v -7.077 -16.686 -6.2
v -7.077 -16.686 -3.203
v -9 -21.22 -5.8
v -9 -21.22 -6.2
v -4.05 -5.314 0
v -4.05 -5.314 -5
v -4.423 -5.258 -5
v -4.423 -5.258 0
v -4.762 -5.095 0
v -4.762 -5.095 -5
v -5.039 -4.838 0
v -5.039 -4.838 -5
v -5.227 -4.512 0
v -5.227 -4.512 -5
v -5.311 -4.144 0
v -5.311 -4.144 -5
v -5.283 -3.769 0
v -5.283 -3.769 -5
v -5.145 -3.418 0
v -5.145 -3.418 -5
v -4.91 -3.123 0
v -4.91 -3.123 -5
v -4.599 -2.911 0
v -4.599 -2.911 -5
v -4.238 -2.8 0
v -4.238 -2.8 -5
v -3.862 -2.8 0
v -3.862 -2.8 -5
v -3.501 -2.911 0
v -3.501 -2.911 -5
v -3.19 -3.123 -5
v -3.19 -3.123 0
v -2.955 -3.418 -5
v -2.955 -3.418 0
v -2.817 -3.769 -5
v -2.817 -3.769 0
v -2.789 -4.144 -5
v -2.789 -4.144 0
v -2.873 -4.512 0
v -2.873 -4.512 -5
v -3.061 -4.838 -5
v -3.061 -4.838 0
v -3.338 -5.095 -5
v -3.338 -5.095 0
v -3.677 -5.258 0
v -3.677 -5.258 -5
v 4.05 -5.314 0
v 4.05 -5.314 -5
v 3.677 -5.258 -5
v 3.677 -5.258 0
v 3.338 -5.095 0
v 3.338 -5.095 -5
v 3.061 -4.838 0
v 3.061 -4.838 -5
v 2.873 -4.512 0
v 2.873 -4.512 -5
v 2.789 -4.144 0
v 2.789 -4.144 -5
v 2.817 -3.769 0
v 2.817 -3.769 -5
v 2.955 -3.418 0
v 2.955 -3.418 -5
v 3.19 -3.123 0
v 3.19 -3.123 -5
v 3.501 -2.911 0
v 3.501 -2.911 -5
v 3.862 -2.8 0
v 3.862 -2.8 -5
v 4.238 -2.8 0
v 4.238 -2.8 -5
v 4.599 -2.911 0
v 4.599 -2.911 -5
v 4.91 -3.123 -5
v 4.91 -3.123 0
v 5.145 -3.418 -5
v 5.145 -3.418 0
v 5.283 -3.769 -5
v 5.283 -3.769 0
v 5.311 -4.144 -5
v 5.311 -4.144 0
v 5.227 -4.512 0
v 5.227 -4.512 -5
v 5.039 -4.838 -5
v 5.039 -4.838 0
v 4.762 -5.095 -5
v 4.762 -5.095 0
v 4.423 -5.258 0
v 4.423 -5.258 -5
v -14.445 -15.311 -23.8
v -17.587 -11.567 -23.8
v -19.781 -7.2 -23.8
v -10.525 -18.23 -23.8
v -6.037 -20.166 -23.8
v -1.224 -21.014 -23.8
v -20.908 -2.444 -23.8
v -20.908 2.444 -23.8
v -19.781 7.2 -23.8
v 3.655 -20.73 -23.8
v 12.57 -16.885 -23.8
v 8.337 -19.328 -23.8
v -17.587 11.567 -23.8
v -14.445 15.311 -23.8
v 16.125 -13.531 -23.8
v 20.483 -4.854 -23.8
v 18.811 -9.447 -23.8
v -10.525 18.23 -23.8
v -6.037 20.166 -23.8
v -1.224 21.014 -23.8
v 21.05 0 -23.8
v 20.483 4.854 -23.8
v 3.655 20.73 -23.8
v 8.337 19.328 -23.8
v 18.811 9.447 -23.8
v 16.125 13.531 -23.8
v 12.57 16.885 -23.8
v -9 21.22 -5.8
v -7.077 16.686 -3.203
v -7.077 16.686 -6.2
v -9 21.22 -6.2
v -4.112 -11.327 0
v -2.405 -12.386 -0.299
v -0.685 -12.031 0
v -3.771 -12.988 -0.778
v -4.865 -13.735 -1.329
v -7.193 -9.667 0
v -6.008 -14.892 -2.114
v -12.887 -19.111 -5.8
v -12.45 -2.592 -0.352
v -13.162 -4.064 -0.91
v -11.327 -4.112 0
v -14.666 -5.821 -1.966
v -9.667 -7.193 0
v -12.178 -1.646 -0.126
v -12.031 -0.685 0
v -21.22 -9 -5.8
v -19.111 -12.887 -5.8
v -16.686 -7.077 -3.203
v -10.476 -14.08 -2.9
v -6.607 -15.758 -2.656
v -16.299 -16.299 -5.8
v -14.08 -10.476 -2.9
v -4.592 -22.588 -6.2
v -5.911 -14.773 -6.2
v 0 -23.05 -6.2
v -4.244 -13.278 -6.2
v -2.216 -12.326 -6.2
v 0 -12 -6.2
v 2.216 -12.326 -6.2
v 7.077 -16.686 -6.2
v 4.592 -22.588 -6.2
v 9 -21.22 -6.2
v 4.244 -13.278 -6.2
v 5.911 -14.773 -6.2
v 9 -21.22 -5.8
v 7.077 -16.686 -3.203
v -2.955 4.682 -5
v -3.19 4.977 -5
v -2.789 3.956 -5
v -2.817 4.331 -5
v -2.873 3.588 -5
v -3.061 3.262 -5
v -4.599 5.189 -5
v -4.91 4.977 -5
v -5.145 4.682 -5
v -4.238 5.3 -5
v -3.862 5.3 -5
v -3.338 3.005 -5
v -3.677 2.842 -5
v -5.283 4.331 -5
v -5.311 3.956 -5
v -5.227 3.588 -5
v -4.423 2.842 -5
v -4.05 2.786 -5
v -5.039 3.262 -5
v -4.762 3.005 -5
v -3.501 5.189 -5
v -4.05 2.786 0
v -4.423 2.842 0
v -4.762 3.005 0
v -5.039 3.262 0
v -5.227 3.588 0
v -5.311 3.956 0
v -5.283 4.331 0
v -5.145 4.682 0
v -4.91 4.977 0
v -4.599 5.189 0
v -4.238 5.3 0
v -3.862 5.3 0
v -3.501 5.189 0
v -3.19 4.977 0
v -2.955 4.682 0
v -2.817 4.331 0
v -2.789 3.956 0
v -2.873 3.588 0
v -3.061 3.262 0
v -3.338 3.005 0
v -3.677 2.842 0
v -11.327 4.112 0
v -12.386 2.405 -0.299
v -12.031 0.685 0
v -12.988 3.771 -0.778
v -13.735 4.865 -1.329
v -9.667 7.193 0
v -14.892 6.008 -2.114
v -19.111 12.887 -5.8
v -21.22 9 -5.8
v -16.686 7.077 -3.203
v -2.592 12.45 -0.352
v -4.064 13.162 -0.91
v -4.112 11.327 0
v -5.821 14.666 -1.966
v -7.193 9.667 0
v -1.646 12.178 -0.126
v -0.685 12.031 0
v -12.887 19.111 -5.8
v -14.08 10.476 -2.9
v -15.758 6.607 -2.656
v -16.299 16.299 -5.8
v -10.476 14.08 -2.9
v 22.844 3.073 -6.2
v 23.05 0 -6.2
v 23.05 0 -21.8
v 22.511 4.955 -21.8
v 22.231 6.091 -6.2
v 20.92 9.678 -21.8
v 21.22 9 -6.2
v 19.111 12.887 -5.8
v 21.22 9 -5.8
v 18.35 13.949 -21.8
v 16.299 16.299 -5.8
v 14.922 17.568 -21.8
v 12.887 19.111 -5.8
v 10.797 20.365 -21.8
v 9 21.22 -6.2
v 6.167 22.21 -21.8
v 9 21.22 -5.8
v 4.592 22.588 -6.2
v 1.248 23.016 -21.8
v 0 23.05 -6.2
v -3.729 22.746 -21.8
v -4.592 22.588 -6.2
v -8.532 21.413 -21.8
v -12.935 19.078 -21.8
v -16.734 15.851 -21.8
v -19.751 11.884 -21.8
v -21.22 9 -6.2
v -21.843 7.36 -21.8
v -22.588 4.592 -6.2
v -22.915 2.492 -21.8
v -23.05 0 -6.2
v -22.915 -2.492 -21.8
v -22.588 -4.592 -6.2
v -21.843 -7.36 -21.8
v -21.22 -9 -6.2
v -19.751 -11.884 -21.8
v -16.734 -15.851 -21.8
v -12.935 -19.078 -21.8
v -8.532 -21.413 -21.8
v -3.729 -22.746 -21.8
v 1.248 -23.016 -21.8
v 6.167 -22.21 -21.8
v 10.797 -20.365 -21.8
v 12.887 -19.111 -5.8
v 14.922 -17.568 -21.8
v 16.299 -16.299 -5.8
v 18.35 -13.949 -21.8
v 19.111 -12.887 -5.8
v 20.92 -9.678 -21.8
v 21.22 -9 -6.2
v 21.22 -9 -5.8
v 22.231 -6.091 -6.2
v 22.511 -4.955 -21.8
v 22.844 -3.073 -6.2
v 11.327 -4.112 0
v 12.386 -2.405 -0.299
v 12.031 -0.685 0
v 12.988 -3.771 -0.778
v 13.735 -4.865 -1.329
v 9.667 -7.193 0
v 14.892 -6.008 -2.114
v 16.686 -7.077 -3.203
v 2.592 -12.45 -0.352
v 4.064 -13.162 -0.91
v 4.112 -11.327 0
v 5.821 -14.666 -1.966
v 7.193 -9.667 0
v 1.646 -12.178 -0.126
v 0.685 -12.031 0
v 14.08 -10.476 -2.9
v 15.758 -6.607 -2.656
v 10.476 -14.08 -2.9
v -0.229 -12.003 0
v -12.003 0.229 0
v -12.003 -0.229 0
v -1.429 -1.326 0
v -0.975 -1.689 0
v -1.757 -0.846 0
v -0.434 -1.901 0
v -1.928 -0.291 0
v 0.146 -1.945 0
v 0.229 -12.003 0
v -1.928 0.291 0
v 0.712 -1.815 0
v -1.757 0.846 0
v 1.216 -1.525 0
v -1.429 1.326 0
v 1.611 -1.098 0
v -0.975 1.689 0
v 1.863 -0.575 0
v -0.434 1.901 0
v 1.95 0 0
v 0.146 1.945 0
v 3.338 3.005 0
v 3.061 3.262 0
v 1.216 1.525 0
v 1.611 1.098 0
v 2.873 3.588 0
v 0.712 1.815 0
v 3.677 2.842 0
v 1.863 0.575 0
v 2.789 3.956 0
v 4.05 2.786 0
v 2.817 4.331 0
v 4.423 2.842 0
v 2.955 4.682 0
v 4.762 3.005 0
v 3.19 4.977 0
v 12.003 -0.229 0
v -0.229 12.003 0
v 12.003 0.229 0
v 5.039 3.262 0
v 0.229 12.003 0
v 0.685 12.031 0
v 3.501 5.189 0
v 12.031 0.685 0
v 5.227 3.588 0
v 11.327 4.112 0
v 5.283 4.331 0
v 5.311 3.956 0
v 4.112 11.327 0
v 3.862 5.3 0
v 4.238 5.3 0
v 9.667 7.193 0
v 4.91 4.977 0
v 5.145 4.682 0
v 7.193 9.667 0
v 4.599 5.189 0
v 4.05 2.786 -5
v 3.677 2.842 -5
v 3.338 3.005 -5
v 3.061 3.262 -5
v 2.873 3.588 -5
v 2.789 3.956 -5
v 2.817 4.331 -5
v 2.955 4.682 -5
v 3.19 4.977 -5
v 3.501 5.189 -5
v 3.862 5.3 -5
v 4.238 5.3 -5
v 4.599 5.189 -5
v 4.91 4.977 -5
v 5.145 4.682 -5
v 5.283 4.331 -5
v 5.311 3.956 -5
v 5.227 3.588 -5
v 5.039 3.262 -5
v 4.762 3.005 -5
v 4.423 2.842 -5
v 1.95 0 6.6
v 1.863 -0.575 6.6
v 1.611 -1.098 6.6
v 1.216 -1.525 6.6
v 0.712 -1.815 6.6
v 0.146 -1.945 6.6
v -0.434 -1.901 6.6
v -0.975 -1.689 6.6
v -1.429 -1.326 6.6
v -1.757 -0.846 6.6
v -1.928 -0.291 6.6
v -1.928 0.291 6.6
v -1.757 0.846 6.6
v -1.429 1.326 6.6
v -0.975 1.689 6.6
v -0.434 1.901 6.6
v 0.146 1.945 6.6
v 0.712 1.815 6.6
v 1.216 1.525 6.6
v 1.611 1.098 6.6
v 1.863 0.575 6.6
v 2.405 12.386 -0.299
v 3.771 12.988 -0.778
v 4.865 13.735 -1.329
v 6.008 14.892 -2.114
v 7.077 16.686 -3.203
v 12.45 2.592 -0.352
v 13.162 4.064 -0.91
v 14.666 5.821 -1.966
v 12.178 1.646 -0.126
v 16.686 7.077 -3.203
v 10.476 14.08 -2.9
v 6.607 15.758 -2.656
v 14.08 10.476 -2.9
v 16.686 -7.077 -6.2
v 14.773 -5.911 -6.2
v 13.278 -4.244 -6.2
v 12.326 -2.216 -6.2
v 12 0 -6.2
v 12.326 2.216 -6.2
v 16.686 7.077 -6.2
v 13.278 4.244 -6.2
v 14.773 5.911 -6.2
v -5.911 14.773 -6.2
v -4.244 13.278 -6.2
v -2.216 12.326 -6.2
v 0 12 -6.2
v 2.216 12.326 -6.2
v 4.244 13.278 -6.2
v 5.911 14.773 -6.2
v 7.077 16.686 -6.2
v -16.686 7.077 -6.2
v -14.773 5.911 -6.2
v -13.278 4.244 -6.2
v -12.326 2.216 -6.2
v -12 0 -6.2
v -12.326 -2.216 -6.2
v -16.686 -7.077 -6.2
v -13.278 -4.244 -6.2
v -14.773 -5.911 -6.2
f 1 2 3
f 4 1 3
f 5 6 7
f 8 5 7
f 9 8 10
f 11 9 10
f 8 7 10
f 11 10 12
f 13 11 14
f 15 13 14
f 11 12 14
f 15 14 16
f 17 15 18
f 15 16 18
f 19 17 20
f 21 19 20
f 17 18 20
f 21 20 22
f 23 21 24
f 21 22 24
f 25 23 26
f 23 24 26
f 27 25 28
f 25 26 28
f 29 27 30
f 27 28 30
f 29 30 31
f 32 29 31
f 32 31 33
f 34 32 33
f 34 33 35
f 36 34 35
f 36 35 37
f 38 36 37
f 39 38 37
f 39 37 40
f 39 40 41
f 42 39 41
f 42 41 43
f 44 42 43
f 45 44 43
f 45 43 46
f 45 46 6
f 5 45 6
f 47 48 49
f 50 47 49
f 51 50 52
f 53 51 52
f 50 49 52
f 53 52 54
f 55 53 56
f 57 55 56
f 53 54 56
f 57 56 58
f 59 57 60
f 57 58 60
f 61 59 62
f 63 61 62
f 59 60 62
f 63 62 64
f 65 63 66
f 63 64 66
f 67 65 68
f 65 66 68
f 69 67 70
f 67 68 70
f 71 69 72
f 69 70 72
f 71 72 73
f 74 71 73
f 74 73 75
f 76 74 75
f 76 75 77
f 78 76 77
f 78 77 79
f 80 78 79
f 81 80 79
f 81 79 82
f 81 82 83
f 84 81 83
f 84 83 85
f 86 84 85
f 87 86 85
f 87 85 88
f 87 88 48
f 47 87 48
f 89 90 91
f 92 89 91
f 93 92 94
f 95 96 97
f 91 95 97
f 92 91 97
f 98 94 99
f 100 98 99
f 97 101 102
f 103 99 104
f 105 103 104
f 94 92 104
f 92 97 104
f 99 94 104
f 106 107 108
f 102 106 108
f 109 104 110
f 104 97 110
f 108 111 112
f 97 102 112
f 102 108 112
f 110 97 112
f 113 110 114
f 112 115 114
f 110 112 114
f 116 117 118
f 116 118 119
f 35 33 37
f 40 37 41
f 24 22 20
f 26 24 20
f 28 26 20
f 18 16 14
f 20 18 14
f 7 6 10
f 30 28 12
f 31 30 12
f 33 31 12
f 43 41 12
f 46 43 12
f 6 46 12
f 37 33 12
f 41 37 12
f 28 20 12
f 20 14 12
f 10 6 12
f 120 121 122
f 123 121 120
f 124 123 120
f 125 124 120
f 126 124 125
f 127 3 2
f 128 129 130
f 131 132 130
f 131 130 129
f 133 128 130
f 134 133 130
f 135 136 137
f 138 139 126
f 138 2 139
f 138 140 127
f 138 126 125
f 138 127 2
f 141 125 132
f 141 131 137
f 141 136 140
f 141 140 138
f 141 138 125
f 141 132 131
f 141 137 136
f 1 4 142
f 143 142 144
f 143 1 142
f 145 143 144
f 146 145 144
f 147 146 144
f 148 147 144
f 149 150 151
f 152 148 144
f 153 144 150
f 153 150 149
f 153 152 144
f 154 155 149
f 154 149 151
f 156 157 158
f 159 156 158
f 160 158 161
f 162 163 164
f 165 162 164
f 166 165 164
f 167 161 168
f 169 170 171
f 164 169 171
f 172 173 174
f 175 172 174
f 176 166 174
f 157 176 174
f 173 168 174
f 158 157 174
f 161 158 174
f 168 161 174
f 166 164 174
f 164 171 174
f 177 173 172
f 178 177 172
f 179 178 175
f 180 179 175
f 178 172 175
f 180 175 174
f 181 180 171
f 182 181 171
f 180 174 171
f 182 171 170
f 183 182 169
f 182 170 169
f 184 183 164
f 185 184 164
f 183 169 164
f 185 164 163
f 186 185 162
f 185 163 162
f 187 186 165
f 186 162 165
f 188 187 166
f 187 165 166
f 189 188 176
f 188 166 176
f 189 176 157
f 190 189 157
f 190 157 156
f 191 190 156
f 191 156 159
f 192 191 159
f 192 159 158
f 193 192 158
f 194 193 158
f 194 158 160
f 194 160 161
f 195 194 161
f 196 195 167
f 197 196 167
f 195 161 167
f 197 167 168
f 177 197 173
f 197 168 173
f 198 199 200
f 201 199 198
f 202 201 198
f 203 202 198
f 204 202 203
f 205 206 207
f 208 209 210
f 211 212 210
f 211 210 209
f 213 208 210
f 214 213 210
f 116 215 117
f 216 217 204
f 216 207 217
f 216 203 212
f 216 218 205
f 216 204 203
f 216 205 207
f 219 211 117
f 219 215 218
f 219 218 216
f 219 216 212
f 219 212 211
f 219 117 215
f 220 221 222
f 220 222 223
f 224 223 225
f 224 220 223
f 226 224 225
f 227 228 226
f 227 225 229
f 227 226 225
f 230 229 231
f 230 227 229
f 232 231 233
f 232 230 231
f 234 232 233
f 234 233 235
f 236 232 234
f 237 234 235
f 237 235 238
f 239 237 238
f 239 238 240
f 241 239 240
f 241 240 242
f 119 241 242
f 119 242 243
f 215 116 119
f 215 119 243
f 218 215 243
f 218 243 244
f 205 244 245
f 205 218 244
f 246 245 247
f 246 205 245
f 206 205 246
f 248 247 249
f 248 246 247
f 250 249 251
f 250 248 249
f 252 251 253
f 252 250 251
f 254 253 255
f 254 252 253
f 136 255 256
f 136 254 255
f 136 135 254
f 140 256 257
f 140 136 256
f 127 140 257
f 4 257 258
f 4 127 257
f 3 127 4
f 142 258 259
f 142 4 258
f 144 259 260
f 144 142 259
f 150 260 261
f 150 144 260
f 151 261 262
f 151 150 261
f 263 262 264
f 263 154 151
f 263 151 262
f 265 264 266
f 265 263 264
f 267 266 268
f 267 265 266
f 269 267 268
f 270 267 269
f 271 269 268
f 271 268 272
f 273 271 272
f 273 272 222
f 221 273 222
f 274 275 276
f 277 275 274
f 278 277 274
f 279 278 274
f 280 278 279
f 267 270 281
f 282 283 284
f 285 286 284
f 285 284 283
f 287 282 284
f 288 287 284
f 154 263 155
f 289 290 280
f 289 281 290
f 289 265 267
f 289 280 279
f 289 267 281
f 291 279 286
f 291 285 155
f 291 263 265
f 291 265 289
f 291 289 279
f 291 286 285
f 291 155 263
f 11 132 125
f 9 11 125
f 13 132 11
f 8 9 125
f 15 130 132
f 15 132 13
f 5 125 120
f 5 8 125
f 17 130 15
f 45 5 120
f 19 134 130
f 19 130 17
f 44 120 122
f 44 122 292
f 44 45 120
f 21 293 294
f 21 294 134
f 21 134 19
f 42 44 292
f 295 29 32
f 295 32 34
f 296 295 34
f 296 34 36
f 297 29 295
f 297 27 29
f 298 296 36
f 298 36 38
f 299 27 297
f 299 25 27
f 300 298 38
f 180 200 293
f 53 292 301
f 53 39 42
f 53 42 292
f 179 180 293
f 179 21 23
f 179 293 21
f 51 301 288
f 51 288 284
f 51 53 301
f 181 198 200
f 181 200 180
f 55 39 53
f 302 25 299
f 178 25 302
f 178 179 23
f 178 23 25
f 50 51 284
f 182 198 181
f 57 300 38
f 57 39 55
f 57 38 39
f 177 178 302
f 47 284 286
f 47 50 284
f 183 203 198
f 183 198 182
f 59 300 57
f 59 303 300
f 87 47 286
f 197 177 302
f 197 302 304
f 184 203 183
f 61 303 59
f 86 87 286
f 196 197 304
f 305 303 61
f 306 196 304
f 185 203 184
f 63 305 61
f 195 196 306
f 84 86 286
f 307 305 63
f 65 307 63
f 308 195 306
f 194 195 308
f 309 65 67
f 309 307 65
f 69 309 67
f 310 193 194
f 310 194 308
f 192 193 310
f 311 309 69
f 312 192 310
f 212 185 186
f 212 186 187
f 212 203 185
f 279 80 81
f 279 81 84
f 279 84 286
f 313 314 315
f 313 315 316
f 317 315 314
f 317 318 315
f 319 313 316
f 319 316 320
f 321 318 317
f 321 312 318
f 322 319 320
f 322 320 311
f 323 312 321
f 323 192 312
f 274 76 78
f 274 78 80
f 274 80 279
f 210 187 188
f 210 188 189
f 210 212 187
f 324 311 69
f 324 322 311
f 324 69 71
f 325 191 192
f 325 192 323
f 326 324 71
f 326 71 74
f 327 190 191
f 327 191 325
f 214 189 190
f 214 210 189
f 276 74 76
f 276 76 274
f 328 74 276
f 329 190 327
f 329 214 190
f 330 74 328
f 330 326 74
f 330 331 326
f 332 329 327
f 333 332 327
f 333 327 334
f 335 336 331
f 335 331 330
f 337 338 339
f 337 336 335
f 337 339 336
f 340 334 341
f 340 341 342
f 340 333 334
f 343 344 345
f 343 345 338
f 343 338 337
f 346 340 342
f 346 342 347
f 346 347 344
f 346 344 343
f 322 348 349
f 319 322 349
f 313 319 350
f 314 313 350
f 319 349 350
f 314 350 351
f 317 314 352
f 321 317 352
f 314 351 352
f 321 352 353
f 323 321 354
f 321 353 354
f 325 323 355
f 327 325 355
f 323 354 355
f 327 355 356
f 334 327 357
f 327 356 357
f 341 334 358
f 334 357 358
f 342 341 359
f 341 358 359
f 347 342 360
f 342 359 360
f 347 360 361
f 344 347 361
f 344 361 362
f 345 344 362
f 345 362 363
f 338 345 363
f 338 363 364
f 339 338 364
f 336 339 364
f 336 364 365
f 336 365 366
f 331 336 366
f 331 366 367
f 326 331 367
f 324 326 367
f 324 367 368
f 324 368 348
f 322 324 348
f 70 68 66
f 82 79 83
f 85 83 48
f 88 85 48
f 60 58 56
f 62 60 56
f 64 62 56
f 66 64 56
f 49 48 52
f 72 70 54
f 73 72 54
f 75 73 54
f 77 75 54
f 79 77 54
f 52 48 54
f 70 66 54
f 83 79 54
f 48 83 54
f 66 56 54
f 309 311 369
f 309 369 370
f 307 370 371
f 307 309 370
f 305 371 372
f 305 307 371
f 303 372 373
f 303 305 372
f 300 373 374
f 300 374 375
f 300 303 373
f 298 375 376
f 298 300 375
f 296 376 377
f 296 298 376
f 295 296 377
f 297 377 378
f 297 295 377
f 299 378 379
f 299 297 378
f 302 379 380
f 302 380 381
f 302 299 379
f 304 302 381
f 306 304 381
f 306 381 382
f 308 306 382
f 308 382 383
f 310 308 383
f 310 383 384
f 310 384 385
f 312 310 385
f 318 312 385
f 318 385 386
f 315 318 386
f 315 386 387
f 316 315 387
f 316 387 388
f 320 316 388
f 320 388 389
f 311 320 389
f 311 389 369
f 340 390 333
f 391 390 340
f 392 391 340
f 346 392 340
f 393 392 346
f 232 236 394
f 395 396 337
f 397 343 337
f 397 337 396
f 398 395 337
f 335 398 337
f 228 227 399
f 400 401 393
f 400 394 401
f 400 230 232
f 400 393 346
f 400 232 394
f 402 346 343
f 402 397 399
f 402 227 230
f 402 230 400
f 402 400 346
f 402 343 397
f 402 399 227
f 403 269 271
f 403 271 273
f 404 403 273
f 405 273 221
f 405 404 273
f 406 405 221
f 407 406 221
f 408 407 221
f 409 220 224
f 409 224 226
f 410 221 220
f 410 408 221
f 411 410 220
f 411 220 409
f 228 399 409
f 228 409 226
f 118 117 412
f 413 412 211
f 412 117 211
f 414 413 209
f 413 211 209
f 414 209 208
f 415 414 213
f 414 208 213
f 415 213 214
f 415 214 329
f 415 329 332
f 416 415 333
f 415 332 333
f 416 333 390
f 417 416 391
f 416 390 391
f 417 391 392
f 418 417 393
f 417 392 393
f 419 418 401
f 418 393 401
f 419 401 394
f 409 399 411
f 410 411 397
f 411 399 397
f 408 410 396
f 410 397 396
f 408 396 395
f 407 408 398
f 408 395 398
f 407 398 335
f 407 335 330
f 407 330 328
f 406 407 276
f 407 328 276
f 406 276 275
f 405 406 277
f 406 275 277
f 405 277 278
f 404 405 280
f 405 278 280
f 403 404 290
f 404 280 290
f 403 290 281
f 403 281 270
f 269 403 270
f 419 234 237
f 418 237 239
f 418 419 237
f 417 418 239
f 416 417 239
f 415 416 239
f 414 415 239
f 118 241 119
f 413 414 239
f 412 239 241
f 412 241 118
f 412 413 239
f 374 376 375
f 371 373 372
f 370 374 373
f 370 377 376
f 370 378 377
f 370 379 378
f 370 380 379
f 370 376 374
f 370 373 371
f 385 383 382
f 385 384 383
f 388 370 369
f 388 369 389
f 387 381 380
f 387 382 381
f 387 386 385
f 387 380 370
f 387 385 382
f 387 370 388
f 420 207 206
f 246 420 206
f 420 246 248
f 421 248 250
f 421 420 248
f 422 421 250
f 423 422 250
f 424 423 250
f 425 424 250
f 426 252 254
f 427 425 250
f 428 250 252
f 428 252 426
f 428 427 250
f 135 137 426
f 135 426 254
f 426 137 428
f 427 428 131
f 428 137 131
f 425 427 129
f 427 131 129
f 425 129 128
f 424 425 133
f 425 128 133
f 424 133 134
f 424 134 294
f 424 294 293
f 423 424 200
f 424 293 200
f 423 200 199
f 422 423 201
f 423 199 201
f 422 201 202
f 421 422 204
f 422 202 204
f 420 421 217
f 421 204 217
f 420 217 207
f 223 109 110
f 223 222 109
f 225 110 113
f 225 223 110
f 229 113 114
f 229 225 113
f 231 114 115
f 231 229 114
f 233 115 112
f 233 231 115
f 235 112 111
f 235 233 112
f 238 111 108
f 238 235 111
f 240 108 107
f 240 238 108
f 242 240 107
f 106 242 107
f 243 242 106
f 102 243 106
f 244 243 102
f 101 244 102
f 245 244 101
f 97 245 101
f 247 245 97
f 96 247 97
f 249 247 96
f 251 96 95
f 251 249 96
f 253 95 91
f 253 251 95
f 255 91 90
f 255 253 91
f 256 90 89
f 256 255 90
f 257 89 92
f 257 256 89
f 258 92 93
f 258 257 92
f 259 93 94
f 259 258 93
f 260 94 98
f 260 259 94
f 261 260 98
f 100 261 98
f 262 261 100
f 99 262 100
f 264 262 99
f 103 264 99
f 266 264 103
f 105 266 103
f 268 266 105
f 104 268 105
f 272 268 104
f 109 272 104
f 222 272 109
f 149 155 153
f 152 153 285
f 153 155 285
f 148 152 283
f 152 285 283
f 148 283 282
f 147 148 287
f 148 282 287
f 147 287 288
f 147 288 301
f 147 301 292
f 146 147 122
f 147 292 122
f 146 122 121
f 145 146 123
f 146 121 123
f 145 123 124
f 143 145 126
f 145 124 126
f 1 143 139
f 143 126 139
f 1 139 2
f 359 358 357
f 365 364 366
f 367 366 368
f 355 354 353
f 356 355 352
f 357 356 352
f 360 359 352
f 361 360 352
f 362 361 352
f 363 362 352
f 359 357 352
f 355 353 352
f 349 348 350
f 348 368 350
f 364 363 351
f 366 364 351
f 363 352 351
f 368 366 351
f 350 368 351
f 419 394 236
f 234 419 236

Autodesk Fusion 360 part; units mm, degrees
sketch "Sketch1" plane through (0, 0, 0) normal (0, 0, 1) x (1, 0, 0)
  circle A0 centre (0, 0) radius 23.05
  line L0 (4.05, 4.05) -> (-4.05, 4.05) construction
  line L1 (-4.05, 4.05) -> (-4.05, -4.05) construction
  line L2 (-4.05, -4.05) -> (4.05, -4.05) construction
  line L3 (4.05, -4.05) -> (4.05, 4.05) construction
  line L4 (4.05, 4.05) -> (-4.05, -4.05) construction
  line L5 (-4.05, 4.05) -> (4.05, -4.05) construction
  circle A1 centre (0, 0) radius 1.95
  circle A2 centre (0, 0) radius 12
  line L6 (0, 0) -> (-9, -21.2203)
  line L7 (0, 0) -> (9, -21.2203)
  arc A3 (7.0767, -16.6855) -> (-7.0767, -16.6855) centre (0, -19.6868) ccw
  dimension "d1" = 46.1
  dimension "d2" = 8.1
  dimension "d3" = 8.1
  dimension "d4" = 3.9
  dimension "d5" = 24
  dimension "d19" = 18
  dimension "d20" = 9
extrude "Extrude1" add sketch "Sketch1" against normal blind 23.8
chamfer "Chamfer1" distance 11 distance2 5.8 1 edges at (-21.4901, -8.3352, 0) measured on face at (5.3767, -4.1064, 0)
extrude "Extrude2" add sketch "Sketch1" along normal blind 6.6 contours A1 L6 L7 | A1 L6 L7
chamfer "Chamfer2" distance 2 angle 45 1 edges at (-21.4901, 8.3352, -23.8)
hole "Hole1" at (-4.05, -4.05, 0) at (-4.05, 4.05, 0) at (4.05, 4.05, 0) at (4.05, -4.05, 0) direction (0, 0, -1) diameter 2.529 depth 5 tip angle 180
extrude "Extrude3" cut sketch "Sketch1" against normal up to surface (6.2 mm away) contours A0 L6 L7 A3
pattern_circular "C-Pattern1" count 4 over 360 about axis through (0, 0, 0) along (0, 0, 1) of "Extrude3"
equation "d9 = 23.8 mm - 18 mm"
equation "d20 = d19 / 2"
